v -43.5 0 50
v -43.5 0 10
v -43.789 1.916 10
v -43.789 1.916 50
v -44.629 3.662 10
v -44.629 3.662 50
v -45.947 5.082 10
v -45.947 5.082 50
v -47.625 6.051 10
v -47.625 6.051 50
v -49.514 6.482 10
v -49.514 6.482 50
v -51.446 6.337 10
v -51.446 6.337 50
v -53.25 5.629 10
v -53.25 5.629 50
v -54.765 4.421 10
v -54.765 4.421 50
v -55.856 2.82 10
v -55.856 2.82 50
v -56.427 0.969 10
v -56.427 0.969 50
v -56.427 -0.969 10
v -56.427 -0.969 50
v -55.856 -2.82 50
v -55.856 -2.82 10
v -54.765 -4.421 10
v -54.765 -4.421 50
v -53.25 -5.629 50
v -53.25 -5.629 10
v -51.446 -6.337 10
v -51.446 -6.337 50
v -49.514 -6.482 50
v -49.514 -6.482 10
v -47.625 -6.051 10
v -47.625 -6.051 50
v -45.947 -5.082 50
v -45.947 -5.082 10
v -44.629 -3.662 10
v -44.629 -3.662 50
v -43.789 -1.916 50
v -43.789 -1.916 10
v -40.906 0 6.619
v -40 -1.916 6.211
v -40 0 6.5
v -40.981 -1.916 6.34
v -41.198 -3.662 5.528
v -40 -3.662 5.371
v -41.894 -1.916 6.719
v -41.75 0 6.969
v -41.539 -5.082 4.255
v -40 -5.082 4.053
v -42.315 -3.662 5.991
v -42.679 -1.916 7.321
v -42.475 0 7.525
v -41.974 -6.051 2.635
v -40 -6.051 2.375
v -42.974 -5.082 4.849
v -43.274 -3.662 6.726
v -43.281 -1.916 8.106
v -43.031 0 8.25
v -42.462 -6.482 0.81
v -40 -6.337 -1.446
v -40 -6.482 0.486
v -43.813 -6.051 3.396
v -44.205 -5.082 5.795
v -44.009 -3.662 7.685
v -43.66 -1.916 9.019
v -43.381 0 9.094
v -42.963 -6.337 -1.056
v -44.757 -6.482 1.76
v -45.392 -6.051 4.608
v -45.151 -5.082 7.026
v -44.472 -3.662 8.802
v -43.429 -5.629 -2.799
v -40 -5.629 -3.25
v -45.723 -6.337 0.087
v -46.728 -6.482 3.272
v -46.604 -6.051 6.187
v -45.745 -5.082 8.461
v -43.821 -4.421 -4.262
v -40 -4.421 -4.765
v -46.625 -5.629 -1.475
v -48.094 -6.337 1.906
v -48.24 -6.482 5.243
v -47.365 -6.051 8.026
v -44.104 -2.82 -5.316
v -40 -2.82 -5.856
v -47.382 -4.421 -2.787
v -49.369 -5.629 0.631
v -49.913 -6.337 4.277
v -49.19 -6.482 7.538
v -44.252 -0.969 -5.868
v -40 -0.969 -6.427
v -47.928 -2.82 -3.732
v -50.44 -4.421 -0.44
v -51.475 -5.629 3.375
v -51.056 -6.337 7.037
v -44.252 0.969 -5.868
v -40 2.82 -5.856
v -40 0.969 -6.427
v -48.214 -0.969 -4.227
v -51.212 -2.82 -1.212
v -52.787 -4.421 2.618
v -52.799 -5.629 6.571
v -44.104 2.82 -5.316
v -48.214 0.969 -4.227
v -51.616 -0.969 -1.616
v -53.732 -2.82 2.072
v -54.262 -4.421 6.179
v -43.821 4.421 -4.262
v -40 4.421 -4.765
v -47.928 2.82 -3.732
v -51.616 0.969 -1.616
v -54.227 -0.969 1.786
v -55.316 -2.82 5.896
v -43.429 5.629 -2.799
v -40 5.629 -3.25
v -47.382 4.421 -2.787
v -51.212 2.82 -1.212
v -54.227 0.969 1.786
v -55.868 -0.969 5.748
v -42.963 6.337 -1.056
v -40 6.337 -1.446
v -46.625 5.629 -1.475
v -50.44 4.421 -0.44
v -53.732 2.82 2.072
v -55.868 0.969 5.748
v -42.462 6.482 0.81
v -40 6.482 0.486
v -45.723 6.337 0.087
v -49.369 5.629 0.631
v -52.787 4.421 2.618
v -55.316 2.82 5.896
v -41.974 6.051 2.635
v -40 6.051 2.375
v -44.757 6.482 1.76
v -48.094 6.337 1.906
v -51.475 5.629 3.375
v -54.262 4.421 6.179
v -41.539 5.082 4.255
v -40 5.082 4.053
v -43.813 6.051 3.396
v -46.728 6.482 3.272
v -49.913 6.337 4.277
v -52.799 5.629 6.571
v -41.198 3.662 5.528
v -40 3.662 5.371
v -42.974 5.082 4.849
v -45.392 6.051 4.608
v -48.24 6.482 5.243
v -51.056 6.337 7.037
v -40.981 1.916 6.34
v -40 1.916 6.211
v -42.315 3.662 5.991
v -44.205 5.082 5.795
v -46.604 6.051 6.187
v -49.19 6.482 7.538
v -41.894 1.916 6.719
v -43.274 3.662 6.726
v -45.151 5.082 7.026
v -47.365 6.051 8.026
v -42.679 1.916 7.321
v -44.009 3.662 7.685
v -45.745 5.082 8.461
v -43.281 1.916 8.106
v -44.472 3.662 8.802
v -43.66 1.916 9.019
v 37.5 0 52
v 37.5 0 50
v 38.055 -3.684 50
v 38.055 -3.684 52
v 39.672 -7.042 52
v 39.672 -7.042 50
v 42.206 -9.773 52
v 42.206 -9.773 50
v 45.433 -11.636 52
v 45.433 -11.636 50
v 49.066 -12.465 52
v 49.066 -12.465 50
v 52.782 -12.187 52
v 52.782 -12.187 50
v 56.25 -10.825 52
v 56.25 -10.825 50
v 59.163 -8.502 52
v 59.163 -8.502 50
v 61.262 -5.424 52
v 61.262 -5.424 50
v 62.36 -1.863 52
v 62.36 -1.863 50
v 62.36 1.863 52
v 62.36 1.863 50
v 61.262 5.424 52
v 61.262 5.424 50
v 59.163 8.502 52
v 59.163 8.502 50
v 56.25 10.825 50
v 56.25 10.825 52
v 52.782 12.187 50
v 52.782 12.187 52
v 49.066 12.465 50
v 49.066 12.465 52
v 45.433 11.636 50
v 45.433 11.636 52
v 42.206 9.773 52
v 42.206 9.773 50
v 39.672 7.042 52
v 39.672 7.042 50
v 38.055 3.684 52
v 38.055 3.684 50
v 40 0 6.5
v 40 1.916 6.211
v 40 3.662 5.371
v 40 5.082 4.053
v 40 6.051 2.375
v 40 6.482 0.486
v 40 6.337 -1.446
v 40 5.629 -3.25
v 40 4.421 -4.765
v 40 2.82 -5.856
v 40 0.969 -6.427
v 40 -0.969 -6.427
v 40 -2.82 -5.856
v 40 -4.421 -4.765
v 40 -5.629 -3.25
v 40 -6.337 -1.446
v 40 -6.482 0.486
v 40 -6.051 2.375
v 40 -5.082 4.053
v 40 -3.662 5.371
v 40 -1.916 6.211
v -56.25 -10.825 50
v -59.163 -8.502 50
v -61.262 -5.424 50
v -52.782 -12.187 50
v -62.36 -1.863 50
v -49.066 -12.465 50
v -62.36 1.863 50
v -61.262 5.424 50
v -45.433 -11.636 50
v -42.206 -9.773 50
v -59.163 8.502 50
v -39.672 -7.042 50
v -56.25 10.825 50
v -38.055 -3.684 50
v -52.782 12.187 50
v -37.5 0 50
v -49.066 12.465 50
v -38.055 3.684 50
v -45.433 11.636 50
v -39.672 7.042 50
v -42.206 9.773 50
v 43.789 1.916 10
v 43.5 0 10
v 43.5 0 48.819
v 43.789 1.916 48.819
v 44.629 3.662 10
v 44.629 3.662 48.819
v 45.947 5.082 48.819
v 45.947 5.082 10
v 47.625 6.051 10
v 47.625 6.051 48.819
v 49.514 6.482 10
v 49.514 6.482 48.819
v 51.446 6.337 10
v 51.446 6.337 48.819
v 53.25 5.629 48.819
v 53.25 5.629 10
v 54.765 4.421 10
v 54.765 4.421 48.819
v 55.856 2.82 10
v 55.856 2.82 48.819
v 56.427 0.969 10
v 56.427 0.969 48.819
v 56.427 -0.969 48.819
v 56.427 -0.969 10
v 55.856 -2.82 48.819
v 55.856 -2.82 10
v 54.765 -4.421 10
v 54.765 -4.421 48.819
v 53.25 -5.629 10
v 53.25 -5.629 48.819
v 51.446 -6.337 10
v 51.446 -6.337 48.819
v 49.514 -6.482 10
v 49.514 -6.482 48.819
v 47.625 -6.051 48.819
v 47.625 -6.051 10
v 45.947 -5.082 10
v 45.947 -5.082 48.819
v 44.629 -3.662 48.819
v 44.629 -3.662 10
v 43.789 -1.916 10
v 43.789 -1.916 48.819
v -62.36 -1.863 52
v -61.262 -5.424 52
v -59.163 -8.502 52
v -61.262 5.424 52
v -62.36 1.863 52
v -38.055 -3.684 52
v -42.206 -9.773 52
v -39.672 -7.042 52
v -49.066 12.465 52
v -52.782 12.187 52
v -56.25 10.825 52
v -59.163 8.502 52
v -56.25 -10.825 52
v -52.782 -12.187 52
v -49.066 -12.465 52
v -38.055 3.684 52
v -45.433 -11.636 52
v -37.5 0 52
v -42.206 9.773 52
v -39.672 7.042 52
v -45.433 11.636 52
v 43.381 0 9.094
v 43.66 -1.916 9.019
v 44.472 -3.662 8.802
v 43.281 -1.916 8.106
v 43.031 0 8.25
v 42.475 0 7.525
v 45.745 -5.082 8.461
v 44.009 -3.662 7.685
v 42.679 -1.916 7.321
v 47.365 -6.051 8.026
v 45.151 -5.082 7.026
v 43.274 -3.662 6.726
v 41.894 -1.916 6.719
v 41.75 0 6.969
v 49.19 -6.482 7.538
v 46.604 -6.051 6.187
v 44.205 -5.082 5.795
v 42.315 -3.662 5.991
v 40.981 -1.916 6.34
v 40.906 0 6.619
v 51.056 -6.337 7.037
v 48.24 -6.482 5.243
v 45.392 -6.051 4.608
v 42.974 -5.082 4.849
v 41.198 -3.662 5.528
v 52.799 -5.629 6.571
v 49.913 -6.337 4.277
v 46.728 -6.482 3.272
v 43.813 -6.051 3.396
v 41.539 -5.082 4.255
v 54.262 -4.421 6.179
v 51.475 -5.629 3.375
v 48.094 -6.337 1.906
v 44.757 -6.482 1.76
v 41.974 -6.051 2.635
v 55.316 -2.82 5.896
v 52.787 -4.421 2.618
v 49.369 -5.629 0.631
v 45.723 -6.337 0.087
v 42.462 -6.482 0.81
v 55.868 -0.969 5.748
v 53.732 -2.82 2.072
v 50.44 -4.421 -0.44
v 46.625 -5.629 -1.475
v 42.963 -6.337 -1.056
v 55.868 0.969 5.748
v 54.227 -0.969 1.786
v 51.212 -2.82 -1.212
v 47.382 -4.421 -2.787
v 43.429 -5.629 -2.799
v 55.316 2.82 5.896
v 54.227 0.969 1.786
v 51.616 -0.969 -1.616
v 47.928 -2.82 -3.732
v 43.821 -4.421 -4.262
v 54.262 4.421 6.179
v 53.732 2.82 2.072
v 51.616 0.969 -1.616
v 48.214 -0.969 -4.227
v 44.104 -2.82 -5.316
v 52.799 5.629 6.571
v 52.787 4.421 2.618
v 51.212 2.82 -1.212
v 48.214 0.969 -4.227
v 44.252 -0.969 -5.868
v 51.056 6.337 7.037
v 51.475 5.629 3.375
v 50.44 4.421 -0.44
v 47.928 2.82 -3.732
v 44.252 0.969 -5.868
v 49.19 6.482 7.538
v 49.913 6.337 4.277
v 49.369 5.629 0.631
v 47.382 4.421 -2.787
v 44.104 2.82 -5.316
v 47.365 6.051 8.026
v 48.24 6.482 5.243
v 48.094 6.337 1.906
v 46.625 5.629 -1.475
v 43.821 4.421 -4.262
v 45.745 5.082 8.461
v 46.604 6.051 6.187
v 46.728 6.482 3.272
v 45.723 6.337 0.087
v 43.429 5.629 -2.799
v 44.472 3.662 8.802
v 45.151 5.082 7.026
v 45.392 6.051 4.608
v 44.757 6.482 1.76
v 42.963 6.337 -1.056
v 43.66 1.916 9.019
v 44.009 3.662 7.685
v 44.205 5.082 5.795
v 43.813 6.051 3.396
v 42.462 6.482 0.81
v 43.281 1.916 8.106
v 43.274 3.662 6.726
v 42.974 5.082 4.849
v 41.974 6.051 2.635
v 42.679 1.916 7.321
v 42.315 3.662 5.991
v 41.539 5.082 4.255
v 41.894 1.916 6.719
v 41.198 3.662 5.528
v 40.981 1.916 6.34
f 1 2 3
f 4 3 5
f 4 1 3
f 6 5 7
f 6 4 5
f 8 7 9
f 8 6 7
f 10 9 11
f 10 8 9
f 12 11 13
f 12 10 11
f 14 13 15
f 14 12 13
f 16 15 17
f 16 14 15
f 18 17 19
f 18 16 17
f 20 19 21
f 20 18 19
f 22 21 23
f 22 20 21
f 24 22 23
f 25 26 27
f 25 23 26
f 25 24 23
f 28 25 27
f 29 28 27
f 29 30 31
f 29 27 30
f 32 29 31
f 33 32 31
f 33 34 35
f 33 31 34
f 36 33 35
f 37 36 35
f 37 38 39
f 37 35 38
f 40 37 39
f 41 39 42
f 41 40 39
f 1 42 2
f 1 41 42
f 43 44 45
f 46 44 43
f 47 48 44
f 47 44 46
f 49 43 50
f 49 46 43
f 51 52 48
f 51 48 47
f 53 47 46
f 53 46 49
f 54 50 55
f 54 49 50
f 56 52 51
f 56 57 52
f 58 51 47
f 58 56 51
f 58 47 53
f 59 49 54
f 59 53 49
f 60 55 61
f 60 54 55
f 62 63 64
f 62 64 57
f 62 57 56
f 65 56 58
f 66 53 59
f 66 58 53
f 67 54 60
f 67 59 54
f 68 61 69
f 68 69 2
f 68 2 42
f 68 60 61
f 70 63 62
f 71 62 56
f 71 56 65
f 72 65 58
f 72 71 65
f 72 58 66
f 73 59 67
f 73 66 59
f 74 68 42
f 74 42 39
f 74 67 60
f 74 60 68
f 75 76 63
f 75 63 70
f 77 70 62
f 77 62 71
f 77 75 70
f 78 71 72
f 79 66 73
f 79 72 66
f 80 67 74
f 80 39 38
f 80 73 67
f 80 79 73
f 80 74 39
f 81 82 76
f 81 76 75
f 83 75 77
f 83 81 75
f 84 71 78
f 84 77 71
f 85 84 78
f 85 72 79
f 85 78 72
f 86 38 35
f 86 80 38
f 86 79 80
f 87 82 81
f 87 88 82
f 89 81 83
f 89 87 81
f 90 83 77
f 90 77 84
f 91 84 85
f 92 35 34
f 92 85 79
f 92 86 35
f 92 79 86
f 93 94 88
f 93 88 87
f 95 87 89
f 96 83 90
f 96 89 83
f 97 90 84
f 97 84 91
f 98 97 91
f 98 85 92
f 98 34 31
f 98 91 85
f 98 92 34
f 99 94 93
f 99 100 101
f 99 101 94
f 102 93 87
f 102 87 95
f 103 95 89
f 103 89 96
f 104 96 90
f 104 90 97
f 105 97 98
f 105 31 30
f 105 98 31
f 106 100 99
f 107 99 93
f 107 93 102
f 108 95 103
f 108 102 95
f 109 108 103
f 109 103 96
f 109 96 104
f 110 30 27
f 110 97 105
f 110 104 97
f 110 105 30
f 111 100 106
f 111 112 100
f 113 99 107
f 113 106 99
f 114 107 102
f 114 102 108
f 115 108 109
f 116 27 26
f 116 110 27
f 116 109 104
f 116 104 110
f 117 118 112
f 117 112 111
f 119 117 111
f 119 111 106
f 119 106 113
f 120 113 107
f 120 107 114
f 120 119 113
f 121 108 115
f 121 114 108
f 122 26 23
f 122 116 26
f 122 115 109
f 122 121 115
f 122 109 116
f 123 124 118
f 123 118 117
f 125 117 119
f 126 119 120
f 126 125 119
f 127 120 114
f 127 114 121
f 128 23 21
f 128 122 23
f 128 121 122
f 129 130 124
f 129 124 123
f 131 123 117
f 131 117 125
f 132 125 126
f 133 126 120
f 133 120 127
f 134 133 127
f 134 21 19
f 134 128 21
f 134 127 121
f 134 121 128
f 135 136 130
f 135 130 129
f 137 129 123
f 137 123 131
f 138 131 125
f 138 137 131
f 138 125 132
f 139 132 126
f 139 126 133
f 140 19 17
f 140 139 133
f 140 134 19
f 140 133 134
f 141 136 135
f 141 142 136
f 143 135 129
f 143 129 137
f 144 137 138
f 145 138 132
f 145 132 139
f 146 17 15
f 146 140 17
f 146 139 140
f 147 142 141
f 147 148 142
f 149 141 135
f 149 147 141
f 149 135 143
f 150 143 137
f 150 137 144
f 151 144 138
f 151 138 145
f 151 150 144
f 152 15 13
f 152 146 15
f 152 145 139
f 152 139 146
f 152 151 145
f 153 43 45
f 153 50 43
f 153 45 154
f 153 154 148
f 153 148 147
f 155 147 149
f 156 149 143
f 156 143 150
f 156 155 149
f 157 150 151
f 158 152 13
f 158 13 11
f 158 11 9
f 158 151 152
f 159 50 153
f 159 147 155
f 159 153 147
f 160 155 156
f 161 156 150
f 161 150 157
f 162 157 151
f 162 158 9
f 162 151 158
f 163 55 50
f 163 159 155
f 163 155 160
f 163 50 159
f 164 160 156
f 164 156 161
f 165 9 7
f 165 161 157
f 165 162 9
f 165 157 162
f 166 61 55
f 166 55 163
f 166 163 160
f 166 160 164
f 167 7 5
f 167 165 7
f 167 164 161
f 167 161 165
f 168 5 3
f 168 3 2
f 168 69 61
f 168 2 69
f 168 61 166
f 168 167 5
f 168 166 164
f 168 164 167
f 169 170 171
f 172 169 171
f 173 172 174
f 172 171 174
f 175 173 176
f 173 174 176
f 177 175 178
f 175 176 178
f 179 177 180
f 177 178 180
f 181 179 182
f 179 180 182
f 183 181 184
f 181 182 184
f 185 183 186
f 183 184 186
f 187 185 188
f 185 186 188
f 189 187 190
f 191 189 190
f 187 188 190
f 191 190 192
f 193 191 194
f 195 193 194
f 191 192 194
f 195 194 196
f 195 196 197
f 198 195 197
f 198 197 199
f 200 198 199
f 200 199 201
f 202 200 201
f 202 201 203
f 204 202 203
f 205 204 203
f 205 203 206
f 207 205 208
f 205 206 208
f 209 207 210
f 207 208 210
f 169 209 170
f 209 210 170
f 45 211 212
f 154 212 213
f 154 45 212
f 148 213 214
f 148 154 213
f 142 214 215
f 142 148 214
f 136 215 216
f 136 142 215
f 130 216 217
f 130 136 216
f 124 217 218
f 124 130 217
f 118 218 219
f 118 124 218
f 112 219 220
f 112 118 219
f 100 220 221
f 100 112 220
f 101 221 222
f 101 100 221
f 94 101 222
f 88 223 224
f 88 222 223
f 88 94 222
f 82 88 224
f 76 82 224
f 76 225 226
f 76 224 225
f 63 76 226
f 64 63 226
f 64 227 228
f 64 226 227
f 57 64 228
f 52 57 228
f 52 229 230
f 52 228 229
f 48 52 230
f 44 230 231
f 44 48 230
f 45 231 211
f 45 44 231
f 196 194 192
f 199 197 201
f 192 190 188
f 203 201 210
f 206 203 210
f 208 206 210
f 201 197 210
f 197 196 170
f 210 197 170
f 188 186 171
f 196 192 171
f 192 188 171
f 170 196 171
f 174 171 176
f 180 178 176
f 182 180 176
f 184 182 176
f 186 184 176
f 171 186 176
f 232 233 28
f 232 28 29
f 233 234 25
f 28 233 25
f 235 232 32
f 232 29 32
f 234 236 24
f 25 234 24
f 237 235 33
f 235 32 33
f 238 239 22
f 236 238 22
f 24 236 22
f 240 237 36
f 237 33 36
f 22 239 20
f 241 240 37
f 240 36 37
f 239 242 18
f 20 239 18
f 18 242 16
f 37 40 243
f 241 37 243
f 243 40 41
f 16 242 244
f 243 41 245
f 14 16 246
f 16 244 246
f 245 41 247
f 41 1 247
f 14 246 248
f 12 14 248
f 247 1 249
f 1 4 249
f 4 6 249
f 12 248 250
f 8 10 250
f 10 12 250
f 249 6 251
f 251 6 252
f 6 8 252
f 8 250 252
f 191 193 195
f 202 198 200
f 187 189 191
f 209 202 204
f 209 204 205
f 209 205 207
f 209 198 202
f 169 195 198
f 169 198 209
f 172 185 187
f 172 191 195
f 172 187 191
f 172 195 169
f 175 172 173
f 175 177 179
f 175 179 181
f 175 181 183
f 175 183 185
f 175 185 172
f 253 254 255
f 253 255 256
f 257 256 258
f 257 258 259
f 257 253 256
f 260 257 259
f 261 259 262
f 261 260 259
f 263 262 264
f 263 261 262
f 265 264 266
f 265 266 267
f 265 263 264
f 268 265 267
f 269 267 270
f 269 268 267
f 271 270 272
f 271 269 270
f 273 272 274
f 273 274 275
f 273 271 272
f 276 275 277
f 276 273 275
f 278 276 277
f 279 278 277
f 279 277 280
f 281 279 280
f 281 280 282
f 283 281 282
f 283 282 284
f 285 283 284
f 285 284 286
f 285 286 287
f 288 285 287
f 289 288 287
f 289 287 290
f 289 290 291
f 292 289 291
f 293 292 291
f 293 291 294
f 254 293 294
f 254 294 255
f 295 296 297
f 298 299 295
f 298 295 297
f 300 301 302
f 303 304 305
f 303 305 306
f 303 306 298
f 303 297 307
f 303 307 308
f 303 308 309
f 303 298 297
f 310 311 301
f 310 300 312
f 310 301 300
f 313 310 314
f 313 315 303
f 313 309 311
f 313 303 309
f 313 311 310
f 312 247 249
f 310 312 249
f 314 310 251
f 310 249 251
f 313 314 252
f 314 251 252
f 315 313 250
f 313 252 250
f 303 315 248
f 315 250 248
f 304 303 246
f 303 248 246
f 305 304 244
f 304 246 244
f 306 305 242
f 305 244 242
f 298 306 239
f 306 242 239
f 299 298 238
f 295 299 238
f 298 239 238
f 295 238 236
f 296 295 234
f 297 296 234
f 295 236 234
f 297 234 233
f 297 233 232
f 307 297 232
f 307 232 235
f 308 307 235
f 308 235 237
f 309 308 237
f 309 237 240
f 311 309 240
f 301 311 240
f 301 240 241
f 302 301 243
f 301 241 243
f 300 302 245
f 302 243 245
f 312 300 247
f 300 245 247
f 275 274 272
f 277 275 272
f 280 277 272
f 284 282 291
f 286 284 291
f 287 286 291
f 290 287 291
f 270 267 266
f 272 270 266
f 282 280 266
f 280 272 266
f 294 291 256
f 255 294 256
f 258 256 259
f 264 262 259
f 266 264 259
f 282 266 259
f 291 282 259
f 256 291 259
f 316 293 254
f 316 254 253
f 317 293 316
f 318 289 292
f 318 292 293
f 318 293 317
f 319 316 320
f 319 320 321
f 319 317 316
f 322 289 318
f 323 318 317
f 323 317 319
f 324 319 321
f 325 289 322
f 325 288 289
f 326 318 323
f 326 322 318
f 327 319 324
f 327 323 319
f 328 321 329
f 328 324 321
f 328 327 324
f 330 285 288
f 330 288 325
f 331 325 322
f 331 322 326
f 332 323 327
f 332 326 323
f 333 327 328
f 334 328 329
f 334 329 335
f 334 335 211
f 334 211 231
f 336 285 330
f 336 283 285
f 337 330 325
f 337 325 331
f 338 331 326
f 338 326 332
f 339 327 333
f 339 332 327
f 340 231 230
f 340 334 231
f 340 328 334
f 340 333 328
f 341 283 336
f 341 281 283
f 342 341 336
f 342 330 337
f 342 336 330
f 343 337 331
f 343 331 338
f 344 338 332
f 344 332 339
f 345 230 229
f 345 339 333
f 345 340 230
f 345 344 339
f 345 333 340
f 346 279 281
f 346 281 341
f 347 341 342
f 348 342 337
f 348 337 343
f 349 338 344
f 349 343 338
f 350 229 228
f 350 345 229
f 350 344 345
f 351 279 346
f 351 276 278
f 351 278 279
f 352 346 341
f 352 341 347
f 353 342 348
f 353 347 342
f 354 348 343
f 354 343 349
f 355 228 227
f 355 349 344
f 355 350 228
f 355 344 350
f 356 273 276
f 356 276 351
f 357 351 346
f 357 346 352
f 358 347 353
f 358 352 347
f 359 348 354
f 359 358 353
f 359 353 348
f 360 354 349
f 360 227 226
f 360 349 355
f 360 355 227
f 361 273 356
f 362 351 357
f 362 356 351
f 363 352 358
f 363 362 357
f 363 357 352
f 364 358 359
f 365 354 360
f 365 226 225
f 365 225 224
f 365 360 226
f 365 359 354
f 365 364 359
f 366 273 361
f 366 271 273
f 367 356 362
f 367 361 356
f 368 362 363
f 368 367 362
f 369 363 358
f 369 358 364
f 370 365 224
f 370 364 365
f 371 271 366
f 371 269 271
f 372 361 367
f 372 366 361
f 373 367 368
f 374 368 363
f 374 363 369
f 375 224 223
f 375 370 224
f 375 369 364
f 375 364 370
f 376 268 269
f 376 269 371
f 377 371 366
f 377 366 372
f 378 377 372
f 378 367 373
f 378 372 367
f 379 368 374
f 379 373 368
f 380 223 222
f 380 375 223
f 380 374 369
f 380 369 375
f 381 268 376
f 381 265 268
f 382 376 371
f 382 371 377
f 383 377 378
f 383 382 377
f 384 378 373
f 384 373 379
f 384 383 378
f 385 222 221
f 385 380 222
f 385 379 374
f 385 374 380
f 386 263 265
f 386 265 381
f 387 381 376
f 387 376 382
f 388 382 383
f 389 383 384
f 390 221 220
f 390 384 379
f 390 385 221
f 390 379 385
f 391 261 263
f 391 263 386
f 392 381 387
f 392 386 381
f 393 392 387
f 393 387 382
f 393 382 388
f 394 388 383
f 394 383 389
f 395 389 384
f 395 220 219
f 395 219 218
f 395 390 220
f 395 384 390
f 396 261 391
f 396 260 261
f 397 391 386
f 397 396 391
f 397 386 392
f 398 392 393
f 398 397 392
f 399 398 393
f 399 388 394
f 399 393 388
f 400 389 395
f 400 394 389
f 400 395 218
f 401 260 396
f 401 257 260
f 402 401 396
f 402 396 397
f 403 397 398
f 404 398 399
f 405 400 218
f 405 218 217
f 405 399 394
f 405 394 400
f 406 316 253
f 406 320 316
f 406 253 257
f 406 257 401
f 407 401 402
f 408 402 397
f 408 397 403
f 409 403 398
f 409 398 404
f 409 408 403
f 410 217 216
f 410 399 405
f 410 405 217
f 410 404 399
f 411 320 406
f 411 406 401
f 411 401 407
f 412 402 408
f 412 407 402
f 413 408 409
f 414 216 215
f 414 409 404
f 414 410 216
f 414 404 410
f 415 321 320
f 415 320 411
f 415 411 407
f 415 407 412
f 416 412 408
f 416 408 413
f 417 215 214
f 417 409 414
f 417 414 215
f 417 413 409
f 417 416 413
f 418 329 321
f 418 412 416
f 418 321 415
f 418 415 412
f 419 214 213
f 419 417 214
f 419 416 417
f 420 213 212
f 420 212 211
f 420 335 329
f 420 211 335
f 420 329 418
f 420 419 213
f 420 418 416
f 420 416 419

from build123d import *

# Parameters (mm, degrees)
BALAYAGE2_PROFILE_R = 6.5
BOSS_EXTRU_1_START  = 50
ESQUISSE15_R        = 12.5
BOSS_EXTRU_1_DEPTH  = 2


with BuildPart() as part:
    # Balayage2: sweep along a path in Esquisse1
    with BuildLine(Plane(origin=(0, 0, 0), x_dir=(1, 0, 0), z_dir=(0, 1, 0))) as balayage2_path:
        Line((50, -48.818897638), (50, -10))
        ThreePointArc((50, -10), (47.071067812, -2.928932188), (40, 0))
        Line((40, 0), (-40, 0))
        ThreePointArc((-40, 0), (-47.071067812, -2.928932188), (-50, -10))
        Line((-50, -10), (-50, -50))
    # Balayage2 profile (on start of the path) → Balayage2 (sweep)
    with BuildSketch(Plane(origin=(50, 0, 48.818897638), x_dir=(-1, 0, 0), z_dir=(0, 0, -1))):
        Circle(BALAYAGE2_PROFILE_R)
    sweep(path=balayage2_path.line)

    # Esquisse15 → Boss.-Extru.1 (add)
    with BuildSketch(Plane.XY.offset(BOSS_EXTRU_1_START)):
        with Locations((-50, 0)):
            Circle(ESQUISSE15_R)
        with Locations(Location((50, 0, 0), (0, 0, 180))):
            Circle(ESQUISSE15_R)
    extrude(amount=BOSS_EXTRU_1_DEPTH)


with BuildPart() as boss_extru_1_piece_1:
    # of the separate pieces the step leaves, piece 1, a body of its own (boss_extru_1_pieces)
    add(part.part.solids().sort_by_distance((-37.5, 0, 50))[0])


with BuildPart() as boss_extru_1_piece_2:
    # of the separate pieces the step leaves, piece 2, a body of its own (boss_extru_1_pieces)
    add(part.part.solids().sort_by_distance((37.5, 0, 50))[0])


solid = Compound([boss_extru_1_piece_1.part, boss_extru_1_piece_2.part])
